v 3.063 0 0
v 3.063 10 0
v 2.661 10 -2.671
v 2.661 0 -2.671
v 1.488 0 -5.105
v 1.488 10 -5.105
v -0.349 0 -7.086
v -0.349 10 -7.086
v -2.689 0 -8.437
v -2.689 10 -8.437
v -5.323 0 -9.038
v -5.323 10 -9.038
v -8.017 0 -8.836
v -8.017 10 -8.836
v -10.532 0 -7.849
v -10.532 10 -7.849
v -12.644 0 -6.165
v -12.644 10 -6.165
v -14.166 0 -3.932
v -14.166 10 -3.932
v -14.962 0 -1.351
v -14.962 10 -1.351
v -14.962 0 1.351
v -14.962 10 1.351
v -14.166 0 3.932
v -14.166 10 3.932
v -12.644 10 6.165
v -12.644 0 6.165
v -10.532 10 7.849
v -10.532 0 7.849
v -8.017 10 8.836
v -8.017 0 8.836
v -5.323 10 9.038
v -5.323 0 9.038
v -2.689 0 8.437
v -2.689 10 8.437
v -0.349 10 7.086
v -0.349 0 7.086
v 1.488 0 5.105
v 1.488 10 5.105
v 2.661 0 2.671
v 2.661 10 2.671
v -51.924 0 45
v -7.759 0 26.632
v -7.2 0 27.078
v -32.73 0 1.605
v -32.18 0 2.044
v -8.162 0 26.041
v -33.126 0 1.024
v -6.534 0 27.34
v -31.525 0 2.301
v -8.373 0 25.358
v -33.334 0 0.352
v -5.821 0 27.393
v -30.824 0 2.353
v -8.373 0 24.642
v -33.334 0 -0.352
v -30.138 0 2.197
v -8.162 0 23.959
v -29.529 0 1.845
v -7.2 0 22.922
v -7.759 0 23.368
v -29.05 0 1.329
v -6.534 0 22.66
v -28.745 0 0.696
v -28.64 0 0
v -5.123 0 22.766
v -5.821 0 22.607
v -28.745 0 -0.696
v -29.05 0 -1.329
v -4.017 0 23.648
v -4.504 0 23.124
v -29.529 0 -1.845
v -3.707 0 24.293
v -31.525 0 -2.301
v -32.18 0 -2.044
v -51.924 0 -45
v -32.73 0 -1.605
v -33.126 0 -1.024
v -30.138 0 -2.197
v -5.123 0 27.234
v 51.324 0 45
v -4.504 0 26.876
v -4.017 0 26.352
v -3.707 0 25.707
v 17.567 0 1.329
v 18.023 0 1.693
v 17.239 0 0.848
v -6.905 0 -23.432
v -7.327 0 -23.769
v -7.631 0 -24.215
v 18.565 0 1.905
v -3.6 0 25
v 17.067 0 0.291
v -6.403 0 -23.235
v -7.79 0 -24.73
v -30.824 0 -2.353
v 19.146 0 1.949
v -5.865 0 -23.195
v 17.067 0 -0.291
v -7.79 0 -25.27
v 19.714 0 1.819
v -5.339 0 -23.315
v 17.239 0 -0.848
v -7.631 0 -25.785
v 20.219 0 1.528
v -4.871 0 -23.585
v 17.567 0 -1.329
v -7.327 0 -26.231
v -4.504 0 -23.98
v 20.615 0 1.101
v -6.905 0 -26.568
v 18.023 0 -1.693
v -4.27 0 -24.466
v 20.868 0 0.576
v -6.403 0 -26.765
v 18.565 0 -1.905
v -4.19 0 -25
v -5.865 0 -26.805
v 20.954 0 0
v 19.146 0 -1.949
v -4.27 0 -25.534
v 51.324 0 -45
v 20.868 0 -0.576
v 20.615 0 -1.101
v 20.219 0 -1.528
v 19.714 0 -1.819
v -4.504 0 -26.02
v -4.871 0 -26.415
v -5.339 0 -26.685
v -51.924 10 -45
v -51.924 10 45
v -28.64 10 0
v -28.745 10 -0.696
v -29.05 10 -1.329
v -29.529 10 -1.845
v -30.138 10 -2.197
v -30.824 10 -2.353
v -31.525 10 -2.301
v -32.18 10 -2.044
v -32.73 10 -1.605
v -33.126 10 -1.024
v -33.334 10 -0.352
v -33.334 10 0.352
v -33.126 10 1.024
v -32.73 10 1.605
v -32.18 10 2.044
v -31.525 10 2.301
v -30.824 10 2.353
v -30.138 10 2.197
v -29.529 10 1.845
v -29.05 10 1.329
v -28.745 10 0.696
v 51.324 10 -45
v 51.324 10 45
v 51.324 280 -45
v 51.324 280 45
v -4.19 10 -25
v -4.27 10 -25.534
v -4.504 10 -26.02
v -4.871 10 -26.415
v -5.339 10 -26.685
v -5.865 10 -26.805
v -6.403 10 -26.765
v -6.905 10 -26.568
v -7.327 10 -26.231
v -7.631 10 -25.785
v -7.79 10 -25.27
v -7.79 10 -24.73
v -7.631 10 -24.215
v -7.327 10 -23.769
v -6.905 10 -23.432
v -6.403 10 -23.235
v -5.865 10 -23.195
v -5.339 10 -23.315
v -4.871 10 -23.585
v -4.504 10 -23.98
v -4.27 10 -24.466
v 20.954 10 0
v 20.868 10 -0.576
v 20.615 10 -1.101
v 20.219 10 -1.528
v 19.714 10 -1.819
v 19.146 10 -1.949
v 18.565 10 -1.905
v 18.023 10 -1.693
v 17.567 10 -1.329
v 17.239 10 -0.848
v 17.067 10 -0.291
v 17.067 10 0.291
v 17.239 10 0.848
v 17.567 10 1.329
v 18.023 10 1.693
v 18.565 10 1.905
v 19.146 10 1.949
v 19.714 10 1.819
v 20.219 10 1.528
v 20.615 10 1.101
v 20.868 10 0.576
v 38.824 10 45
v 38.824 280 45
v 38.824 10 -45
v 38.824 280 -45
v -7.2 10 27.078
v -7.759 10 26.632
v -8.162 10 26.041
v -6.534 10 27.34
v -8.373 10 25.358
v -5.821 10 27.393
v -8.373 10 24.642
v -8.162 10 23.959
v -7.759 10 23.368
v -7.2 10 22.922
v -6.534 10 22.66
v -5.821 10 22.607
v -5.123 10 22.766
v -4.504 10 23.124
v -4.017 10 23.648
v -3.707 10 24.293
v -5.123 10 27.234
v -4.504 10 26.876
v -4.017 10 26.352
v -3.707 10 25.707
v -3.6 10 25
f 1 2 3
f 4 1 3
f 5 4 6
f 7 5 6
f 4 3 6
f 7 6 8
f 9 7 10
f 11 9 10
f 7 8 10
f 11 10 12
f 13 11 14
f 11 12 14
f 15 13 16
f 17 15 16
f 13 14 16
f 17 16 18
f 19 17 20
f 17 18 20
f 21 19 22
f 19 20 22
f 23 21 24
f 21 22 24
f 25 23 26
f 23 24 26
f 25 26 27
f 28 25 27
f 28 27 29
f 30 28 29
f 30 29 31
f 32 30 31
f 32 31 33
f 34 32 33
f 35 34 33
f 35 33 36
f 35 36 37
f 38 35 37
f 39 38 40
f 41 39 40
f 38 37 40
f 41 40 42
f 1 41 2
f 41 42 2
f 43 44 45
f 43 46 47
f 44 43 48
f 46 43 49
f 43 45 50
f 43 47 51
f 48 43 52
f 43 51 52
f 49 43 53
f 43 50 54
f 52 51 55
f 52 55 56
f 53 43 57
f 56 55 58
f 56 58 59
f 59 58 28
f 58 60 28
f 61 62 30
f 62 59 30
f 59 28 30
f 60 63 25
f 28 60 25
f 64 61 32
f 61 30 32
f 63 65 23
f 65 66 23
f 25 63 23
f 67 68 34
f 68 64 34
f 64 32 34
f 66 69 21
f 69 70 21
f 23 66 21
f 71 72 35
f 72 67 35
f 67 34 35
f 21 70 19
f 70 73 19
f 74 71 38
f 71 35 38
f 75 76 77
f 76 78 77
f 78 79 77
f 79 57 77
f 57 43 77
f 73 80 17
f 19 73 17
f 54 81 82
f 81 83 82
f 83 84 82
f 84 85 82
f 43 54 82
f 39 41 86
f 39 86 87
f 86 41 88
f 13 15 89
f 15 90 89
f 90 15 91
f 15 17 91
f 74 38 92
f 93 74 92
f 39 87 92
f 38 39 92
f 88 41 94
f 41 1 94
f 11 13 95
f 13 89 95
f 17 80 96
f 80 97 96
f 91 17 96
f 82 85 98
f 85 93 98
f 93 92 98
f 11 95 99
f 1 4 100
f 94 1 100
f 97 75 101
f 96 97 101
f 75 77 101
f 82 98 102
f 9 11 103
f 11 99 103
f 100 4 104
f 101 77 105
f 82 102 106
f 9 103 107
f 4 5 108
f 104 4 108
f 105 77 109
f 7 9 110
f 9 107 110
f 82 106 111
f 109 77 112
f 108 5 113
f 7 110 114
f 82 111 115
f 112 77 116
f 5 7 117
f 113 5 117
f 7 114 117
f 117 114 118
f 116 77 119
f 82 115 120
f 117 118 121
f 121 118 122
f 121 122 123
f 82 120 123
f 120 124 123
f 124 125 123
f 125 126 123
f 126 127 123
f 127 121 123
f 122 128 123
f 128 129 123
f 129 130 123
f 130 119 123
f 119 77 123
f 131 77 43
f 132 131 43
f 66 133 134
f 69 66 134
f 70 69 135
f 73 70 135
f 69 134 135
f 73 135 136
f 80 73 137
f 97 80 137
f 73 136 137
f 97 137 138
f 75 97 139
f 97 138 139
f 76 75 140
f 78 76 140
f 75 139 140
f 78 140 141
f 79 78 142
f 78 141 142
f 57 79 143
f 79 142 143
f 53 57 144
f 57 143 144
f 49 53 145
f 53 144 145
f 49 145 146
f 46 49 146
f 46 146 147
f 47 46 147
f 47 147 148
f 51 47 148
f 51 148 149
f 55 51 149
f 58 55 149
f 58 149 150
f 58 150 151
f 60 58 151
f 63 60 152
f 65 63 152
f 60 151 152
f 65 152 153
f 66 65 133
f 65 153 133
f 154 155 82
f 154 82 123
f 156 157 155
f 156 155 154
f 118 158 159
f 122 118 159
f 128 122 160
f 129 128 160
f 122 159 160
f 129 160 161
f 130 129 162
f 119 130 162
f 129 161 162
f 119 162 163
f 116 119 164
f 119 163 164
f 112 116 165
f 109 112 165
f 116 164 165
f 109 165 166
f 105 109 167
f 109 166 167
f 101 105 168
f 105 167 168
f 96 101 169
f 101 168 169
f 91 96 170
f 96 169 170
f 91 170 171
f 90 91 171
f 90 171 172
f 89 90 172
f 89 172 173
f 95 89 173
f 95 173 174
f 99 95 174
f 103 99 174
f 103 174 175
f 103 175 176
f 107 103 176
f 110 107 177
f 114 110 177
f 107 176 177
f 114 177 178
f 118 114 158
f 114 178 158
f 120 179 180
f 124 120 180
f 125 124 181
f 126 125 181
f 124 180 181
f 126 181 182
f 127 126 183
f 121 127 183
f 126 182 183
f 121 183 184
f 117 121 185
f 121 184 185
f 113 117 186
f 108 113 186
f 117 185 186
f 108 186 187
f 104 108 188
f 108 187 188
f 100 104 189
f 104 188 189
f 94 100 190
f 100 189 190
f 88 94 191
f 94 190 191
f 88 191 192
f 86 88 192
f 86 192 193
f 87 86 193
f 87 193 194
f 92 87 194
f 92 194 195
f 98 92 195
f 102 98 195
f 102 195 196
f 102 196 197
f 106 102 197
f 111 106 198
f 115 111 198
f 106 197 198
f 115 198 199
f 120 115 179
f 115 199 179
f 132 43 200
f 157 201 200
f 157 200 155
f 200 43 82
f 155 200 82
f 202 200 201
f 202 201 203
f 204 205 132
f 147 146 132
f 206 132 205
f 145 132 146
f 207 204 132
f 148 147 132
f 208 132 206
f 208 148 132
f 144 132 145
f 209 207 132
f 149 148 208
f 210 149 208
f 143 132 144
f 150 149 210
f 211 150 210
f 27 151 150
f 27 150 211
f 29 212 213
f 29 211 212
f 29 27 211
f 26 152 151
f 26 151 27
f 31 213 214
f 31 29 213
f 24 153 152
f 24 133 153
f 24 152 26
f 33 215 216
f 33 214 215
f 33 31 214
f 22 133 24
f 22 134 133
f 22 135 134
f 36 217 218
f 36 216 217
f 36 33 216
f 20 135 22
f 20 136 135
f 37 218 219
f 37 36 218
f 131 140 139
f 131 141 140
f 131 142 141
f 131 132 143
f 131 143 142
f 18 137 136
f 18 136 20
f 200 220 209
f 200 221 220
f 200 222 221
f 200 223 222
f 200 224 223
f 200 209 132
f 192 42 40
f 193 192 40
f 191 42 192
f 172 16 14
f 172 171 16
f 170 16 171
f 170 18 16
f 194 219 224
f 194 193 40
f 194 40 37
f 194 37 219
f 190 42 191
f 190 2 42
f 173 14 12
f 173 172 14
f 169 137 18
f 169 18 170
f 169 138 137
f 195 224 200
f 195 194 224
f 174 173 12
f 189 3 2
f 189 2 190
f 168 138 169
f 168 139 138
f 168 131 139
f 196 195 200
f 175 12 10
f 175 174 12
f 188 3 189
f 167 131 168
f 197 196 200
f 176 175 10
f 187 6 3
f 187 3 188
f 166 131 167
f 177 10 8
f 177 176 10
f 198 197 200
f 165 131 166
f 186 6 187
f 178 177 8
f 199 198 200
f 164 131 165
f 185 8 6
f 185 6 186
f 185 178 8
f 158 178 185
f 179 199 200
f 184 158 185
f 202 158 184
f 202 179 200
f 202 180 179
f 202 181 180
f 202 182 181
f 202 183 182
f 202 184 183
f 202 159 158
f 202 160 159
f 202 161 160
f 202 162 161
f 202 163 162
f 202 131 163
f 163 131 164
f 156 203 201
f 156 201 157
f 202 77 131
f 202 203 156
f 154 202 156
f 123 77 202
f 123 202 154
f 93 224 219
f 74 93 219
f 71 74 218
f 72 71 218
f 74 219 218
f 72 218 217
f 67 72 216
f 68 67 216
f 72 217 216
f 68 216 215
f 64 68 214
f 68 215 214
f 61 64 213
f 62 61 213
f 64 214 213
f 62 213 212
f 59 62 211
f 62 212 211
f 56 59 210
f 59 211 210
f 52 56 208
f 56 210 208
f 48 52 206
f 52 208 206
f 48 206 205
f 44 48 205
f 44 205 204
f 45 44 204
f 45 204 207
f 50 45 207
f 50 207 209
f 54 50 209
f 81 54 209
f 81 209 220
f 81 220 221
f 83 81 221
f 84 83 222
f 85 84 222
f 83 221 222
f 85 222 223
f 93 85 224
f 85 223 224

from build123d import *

# Parameters (mm, degrees)
SKETCH_1_W          = 400
SKETCH_1_H          = 90
EXTRUDE_1_DEPTH     = 10
SKETCH_2_R          = 9.063152432
CUT_EXTRUDE_1_DEPTH = 10
SKETCH_3_R          = 1.81023823
SKETCH_3_R_2        = 1.954373085
SKETCH_3_R_3        = 2.399911157
SKETCH_3_R_4        = 2.359906839
CUT_EXTRUDE_2_DEPTH = 10
SKETCH_4_R          = 6.073356137
SKETCH_4_R_2        = 6.104859493
SKETCH_4_R_3        = 4.740379866
CUT_EXTRUDE_3_DEPTH = 10
SKETCH_5_W          = 12.49982796
SKETCH_5_H          = 90
EXTRUDE_2_DEPTH     = 270
SKETCH_6_W          = 148.075925294
SKETCH_6_H          = 90
CUT_EXTRUDE_4_DEPTH = 10
SKETCH_7_W          = 153.736310317
SKETCH_7_H          = 106.42917614
CUT_EXTRUDE_5_DEPTH = 10


with BuildPart() as part:
    # 草图1 → 凸台-拉伸1 (new body)
    with BuildSketch(Plane(origin=(0, 0, 0), x_dir=(1, 0, 0), z_dir=(0, 1, 0))):
        Rectangle(SKETCH_1_W, SKETCH_1_H)
    extrude(amount=EXTRUDE_1_DEPTH)

    # 草图2 → 切除-拉伸1 (cut)
    with BuildSketch(Plane(origin=(0, 10, 0), x_dir=(1, 0, 0), z_dir=(0, 1, 0))):
        with Locations((-6, 0)):
            Circle(SKETCH_2_R)
    extrude(amount=-CUT_EXTRUDE_1_DEPTH, mode=Mode.SUBTRACT)

    # 草图3 → 切除-拉伸2 (cut)
    with BuildSketch(Plane(origin=(0, 10, 0), x_dir=(1, 0, 0), z_dir=(0, 1, 0))):
        with Locations((-6, 25)):
            Circle(SKETCH_3_R)
        with Locations((19, 0)):
            Circle(SKETCH_3_R_2)
        with Locations((-6, -25)):
            Circle(SKETCH_3_R_3)
        with Locations((-31, 0)):
            Circle(SKETCH_3_R_4)
    extrude(amount=-CUT_EXTRUDE_2_DEPTH, mode=Mode.SUBTRACT)

    # 草图4 → 切除-拉伸3 (cut)
    with BuildSketch(Plane(origin=(0, 10, 0), x_dir=(1, 0, 0), z_dir=(0, 1, 0))):
        with Locations((-175, -21.552072621)):
            Circle(SKETCH_4_R)
        with Locations((-135, -21.552072621)):
            Circle(SKETCH_4_R_2)
        with Locations((-155, 23.447927379)):
            Circle(SKETCH_4_R_3)
    extrude(amount=-CUT_EXTRUDE_3_DEPTH, mode=Mode.SUBTRACT)

    # 草图5 → 凸台-拉伸2 (add)
    with BuildSketch(Plane(origin=(0, 10, 0), x_dir=(1, 0, 0), z_dir=(0, 1, 0))):
        with Locations((45.073880923, 0)):
            Rectangle(SKETCH_5_W, SKETCH_5_H)
    extrude(amount=EXTRUDE_2_DEPTH)

    # 草图6 → 切除-拉伸4 (cut)
    with BuildSketch(Plane.XZ):
        with Locations((-125.962037353, 0)):
            Rectangle(SKETCH_6_W, SKETCH_6_H)
    extrude(amount=-CUT_EXTRUDE_4_DEPTH, mode=Mode.SUBTRACT)

    # 草图7 → 切除-拉伸5 (cut)
    with BuildSketch(Plane(origin=(0, 10, 0), x_dir=(1, 0, 0), z_dir=(0, 1, 0))):
        with Locations((128.191950062, -8.21458807)):
            Rectangle(SKETCH_7_W, SKETCH_7_H)
    extrude(amount=-CUT_EXTRUDE_5_DEPTH, mode=Mode.SUBTRACT)


solid = part.part
